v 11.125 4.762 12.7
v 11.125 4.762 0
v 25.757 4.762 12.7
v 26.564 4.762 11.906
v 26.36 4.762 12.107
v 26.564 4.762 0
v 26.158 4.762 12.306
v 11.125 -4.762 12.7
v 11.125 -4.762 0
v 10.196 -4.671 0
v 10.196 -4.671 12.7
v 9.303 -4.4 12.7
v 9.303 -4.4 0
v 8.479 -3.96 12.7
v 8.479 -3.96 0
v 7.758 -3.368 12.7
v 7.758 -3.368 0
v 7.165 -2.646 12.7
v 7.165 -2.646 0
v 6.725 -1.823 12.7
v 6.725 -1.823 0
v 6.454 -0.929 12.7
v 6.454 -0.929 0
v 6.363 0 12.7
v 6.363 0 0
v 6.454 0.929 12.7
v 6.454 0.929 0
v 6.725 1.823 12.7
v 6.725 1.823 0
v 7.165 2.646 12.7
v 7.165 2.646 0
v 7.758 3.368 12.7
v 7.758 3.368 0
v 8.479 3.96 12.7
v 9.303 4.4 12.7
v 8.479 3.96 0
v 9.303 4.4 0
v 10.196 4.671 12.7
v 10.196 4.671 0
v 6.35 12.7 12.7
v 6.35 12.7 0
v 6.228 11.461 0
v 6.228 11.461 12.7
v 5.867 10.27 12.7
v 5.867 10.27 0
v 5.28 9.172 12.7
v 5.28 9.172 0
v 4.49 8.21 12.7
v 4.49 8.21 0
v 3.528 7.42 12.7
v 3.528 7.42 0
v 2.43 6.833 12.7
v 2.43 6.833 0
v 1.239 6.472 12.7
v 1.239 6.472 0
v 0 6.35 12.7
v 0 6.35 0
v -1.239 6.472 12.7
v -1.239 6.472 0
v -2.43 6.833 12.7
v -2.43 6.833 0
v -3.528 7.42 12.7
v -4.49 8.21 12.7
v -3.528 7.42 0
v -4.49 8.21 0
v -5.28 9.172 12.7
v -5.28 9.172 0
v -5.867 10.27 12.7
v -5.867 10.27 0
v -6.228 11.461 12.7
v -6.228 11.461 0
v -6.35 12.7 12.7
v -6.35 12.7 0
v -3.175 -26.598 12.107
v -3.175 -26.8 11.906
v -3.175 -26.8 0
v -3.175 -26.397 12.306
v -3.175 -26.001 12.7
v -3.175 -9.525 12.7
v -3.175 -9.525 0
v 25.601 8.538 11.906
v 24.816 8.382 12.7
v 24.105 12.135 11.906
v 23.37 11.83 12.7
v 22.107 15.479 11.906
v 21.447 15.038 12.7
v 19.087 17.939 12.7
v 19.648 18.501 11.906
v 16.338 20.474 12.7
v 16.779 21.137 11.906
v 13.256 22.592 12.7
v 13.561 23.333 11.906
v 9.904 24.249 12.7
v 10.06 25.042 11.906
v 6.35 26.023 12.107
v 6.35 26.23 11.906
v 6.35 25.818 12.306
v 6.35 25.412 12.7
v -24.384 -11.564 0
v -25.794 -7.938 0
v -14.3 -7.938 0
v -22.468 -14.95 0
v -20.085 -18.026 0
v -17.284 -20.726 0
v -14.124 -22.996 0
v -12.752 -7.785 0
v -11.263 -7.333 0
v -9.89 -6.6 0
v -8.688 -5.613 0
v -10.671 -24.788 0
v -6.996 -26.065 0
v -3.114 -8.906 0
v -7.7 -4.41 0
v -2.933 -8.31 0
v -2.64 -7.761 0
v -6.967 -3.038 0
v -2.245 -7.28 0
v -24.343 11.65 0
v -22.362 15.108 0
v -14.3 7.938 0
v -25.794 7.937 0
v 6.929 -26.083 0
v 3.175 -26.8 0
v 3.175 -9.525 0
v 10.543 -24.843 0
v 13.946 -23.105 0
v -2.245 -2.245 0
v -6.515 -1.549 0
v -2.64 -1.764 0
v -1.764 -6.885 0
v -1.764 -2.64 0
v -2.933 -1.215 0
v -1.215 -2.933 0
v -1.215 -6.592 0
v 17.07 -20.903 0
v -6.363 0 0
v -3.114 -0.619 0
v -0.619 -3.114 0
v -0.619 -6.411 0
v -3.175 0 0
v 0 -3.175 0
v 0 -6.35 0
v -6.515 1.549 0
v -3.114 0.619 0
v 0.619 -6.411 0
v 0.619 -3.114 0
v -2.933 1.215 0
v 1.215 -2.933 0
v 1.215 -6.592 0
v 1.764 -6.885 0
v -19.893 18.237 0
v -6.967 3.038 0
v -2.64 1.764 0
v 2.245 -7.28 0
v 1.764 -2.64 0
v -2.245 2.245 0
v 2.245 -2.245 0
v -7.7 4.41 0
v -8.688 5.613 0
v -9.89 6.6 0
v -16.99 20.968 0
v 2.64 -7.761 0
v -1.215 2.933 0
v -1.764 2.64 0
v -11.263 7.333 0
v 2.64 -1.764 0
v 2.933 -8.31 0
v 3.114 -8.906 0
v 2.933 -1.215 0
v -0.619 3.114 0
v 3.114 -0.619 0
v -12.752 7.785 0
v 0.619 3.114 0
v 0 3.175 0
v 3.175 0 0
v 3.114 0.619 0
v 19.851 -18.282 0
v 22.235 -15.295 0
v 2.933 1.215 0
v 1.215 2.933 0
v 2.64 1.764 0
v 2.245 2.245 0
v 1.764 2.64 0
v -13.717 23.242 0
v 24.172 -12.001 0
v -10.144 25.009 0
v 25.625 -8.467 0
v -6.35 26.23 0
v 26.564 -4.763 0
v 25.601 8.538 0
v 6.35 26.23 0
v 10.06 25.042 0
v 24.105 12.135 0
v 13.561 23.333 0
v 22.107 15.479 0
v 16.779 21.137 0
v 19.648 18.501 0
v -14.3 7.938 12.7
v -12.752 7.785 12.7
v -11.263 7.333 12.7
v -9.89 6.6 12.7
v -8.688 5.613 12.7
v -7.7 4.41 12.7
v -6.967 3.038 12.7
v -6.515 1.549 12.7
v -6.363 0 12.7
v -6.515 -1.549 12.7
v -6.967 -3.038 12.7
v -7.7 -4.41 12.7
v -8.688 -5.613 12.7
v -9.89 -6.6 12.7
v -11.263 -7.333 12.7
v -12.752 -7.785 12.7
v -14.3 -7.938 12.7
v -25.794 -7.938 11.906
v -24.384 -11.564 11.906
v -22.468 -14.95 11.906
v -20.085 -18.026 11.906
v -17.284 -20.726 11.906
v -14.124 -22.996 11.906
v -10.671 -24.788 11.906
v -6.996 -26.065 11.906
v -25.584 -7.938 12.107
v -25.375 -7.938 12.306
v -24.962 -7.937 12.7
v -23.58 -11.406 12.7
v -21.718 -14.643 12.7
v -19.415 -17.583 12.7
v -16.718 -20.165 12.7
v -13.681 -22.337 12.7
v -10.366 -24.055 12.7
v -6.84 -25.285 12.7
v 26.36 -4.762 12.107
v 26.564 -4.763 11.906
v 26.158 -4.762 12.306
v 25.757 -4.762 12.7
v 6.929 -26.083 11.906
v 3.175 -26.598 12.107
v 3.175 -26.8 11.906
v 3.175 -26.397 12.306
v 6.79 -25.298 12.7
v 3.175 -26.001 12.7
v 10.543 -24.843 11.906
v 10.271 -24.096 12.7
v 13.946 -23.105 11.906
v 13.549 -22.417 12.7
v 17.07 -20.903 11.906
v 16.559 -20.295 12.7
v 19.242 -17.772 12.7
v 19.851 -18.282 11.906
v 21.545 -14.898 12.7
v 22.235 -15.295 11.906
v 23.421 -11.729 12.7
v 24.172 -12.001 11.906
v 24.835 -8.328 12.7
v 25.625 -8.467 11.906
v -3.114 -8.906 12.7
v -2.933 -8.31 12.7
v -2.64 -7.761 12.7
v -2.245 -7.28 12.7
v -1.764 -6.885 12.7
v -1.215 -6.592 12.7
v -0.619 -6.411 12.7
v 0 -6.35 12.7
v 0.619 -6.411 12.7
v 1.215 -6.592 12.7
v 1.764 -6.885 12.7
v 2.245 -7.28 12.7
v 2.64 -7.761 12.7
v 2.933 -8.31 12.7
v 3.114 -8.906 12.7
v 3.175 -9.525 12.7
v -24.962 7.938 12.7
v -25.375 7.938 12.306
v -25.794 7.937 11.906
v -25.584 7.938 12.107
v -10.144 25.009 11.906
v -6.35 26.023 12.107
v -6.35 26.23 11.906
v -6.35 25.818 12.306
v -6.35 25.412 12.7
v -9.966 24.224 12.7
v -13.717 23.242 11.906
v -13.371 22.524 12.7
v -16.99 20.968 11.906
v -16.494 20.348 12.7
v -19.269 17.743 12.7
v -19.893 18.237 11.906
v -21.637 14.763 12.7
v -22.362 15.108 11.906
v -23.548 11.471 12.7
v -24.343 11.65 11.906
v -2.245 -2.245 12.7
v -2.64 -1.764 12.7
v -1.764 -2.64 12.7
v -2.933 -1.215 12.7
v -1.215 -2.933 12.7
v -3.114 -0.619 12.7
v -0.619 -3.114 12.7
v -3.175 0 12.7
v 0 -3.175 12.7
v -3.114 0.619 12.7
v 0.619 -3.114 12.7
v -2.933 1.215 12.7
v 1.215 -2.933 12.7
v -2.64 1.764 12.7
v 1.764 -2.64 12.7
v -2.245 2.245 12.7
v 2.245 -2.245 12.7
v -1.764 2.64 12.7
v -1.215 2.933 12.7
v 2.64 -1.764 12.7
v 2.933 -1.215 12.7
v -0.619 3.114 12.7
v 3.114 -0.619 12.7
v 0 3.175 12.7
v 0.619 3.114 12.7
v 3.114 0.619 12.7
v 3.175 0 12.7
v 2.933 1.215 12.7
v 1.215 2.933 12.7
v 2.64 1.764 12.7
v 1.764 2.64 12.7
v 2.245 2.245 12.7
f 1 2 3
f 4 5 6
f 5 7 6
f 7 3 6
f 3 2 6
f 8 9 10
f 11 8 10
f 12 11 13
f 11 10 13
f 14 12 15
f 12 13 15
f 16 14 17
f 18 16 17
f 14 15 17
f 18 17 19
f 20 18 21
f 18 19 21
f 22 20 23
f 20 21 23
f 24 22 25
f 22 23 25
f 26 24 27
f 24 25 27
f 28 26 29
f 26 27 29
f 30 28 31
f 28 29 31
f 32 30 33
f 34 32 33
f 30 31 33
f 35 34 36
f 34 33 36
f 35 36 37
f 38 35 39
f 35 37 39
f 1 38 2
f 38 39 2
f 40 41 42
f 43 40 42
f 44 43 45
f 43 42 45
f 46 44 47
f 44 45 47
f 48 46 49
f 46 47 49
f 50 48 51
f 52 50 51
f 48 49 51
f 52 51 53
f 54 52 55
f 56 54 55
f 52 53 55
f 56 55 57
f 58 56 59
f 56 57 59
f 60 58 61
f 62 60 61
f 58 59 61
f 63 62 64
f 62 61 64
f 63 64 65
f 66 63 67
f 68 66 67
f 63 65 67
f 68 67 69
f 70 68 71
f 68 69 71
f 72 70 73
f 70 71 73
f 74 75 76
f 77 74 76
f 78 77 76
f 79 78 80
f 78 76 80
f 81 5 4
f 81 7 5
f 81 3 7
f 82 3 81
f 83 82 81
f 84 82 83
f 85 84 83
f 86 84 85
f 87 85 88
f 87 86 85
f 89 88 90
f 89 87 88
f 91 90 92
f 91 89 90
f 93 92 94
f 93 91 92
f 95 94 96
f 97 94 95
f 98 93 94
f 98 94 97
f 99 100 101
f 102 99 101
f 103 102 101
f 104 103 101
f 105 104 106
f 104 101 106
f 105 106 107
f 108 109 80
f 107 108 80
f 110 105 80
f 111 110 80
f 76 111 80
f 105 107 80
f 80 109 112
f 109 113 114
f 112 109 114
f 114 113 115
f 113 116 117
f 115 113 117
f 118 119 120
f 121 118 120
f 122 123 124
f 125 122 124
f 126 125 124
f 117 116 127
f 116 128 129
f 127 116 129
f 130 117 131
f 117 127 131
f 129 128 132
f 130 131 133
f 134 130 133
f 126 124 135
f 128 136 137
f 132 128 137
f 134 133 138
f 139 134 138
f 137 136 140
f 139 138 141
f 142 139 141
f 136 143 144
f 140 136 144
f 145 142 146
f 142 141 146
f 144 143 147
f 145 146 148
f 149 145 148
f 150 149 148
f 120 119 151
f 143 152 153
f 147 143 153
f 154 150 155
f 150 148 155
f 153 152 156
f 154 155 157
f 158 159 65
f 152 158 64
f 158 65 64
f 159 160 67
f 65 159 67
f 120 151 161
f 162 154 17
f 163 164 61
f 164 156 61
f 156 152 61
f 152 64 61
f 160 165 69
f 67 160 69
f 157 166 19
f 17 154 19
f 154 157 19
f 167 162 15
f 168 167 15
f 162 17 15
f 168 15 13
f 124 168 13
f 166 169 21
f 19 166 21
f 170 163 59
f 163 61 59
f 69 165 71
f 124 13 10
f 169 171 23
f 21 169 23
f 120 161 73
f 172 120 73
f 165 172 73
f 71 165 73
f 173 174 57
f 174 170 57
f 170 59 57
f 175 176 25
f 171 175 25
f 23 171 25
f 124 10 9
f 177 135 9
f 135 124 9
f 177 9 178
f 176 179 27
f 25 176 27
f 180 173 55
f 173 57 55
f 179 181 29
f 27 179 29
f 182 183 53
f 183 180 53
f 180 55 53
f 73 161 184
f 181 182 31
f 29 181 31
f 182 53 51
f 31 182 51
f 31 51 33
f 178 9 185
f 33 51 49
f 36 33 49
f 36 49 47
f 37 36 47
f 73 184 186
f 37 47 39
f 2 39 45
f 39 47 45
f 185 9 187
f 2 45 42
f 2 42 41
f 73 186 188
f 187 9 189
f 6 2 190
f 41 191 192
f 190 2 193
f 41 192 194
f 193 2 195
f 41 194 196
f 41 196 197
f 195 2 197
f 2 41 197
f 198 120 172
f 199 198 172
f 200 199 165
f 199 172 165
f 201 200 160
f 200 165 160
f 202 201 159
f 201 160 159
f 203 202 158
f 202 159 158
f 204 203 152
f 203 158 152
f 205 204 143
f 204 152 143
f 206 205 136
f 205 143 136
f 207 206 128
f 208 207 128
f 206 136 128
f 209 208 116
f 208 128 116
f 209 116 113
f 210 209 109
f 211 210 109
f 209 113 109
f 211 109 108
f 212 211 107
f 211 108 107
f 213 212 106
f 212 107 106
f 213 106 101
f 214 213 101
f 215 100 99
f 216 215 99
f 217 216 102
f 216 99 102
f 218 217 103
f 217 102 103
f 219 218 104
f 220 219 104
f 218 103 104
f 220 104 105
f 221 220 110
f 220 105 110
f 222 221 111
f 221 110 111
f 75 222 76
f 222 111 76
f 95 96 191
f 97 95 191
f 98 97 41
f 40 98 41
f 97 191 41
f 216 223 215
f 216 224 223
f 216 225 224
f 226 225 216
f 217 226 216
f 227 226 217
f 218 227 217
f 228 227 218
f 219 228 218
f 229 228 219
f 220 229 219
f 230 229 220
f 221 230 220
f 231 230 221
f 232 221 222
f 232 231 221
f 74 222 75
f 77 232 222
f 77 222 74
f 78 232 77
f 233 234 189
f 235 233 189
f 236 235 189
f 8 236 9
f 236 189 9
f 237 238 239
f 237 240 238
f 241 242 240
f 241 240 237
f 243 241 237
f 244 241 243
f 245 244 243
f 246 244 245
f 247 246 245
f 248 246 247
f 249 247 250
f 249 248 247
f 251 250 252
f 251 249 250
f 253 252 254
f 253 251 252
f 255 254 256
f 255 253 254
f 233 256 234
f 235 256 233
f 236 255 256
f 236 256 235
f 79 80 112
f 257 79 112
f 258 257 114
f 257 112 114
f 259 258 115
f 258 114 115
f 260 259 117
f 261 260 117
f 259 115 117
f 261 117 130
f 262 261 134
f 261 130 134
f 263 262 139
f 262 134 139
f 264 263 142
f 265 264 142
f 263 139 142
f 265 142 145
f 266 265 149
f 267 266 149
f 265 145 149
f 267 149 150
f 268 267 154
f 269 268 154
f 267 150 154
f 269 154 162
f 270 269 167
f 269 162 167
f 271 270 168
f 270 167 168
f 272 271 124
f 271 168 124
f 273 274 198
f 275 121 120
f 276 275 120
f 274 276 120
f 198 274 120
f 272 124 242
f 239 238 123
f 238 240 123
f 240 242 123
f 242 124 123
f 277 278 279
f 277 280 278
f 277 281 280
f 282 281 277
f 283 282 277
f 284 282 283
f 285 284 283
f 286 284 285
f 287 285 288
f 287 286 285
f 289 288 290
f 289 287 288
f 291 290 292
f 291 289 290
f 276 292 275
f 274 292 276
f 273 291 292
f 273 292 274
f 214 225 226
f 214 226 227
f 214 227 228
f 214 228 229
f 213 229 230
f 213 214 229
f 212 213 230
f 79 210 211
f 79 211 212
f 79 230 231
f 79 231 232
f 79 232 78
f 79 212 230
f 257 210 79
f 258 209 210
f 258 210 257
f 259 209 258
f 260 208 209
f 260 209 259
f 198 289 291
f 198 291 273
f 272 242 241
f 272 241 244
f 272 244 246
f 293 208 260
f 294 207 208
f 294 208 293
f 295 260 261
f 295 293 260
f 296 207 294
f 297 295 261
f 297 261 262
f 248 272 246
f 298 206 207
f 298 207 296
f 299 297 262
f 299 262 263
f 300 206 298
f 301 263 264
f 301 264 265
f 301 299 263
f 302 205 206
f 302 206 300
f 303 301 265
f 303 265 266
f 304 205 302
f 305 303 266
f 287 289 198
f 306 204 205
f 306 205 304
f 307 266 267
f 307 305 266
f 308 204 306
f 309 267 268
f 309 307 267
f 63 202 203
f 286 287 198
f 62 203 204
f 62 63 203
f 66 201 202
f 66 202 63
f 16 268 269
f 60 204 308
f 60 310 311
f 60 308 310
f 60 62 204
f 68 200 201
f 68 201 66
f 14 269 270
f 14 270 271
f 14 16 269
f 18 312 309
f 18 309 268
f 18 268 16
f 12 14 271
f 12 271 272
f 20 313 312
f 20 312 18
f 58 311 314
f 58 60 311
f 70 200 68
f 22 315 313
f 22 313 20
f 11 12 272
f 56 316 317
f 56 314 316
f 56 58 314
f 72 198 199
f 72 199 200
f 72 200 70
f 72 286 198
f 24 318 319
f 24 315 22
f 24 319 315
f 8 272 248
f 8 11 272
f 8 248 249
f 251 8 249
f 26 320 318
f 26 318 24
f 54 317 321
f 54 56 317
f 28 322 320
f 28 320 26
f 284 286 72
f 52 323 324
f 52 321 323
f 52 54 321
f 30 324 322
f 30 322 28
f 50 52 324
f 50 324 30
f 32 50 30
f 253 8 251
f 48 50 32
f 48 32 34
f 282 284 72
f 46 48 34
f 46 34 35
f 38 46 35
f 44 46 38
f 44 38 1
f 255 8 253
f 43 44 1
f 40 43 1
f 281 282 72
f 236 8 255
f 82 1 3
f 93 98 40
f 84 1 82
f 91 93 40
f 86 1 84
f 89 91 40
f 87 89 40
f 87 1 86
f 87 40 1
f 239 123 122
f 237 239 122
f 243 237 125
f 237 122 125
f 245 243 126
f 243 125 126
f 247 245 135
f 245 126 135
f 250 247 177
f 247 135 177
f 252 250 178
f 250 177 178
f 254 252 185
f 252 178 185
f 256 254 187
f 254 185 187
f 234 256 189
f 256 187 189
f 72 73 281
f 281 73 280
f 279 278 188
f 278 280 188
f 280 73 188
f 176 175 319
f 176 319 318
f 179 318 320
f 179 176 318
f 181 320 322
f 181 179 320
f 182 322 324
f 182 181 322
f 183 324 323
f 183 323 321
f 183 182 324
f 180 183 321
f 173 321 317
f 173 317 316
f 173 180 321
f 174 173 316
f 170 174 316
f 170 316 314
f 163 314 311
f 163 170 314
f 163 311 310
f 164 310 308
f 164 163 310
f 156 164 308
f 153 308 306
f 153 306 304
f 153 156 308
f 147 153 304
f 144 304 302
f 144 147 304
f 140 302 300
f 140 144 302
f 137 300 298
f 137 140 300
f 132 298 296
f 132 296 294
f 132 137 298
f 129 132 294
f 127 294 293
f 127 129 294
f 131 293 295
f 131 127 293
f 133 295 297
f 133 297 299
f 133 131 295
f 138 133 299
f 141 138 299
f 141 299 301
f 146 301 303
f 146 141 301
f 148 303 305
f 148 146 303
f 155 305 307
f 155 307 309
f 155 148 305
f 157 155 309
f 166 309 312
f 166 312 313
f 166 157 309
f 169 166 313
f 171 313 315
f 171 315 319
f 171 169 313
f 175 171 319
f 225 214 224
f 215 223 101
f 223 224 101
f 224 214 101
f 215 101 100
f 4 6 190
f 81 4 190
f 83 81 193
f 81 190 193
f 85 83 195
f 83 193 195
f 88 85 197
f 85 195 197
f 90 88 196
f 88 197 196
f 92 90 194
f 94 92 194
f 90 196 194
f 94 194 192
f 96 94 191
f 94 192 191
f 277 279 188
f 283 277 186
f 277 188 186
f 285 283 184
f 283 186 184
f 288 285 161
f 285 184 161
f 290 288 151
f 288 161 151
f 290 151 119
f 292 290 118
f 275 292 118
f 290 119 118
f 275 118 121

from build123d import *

# Parameters (mm, degrees)
F0_R     = 3.175
F1_DEPTH = 12.7
F2_SIZE  = 0.79375


with BuildPart() as f1:
    # F0 (on Top) → F1 (new body)
    with BuildSketch(Plane.XY):
        with BuildLine():
            Line((-6.35, 12.7), (-6.35, 26.229805))
            ThreePointArc((-6.35, 26.229805), (-18.492118, 19.656214), (-25.793822, 7.9375))
            Line((-25.793822, 7.9375), (-14.3002, 7.9375))
            ThreePointArc((-14.3002, 7.9375), (-6.3627, 0), (-14.3002, -7.9375))
            Line((-14.3002, -7.9375), (-25.793822, -7.9375))
            ThreePointArc((-25.793822, -7.9375), (-17.284312, -20.726257), (-3.175, -26.800085))
            Line((-3.175, -26.800085), (-3.175, -9.525))
            ThreePointArc((-3.175, -9.525), (0, -6.35), (3.175, -9.525))
            Line((3.175, -9.525), (3.175, -26.800085))
            ThreePointArc((3.175, -26.800085), (18.507165, -19.642047), (26.563956, -4.7625))
            Line((26.563956, -4.7625), (11.1252, -4.7625))
            ThreePointArc((11.1252, -4.7625), (6.3627, 0), (11.1252, 4.7625))
            Line((11.1252, 4.7625), (26.563956, 4.7625))
            ThreePointArc((26.563956, 4.7625), (19.647988, 18.500858), (6.35, 26.229805))
            Line((6.35, 26.229805), (6.35, 12.7))
            ThreePointArc((6.35, 12.7), (0, 6.35), (-6.35, 12.7))
        make_face()
        Circle(F0_R, mode=Mode.SUBTRACT)
    extrude(amount=F1_DEPTH)

    # F2
    f2_edges = [f1.edges().sort_by_distance(p)[0] for p in [
        (-17.284312, -20.726257, 12.7),
        (18.507165, -19.642047, 12.7),
        (19.647988, 18.500858, 12.7),
        (-18.492118, 19.656214, 12.7),
    ]]
    chamfer(f2_edges, length=F2_SIZE)


solid = f1.part
